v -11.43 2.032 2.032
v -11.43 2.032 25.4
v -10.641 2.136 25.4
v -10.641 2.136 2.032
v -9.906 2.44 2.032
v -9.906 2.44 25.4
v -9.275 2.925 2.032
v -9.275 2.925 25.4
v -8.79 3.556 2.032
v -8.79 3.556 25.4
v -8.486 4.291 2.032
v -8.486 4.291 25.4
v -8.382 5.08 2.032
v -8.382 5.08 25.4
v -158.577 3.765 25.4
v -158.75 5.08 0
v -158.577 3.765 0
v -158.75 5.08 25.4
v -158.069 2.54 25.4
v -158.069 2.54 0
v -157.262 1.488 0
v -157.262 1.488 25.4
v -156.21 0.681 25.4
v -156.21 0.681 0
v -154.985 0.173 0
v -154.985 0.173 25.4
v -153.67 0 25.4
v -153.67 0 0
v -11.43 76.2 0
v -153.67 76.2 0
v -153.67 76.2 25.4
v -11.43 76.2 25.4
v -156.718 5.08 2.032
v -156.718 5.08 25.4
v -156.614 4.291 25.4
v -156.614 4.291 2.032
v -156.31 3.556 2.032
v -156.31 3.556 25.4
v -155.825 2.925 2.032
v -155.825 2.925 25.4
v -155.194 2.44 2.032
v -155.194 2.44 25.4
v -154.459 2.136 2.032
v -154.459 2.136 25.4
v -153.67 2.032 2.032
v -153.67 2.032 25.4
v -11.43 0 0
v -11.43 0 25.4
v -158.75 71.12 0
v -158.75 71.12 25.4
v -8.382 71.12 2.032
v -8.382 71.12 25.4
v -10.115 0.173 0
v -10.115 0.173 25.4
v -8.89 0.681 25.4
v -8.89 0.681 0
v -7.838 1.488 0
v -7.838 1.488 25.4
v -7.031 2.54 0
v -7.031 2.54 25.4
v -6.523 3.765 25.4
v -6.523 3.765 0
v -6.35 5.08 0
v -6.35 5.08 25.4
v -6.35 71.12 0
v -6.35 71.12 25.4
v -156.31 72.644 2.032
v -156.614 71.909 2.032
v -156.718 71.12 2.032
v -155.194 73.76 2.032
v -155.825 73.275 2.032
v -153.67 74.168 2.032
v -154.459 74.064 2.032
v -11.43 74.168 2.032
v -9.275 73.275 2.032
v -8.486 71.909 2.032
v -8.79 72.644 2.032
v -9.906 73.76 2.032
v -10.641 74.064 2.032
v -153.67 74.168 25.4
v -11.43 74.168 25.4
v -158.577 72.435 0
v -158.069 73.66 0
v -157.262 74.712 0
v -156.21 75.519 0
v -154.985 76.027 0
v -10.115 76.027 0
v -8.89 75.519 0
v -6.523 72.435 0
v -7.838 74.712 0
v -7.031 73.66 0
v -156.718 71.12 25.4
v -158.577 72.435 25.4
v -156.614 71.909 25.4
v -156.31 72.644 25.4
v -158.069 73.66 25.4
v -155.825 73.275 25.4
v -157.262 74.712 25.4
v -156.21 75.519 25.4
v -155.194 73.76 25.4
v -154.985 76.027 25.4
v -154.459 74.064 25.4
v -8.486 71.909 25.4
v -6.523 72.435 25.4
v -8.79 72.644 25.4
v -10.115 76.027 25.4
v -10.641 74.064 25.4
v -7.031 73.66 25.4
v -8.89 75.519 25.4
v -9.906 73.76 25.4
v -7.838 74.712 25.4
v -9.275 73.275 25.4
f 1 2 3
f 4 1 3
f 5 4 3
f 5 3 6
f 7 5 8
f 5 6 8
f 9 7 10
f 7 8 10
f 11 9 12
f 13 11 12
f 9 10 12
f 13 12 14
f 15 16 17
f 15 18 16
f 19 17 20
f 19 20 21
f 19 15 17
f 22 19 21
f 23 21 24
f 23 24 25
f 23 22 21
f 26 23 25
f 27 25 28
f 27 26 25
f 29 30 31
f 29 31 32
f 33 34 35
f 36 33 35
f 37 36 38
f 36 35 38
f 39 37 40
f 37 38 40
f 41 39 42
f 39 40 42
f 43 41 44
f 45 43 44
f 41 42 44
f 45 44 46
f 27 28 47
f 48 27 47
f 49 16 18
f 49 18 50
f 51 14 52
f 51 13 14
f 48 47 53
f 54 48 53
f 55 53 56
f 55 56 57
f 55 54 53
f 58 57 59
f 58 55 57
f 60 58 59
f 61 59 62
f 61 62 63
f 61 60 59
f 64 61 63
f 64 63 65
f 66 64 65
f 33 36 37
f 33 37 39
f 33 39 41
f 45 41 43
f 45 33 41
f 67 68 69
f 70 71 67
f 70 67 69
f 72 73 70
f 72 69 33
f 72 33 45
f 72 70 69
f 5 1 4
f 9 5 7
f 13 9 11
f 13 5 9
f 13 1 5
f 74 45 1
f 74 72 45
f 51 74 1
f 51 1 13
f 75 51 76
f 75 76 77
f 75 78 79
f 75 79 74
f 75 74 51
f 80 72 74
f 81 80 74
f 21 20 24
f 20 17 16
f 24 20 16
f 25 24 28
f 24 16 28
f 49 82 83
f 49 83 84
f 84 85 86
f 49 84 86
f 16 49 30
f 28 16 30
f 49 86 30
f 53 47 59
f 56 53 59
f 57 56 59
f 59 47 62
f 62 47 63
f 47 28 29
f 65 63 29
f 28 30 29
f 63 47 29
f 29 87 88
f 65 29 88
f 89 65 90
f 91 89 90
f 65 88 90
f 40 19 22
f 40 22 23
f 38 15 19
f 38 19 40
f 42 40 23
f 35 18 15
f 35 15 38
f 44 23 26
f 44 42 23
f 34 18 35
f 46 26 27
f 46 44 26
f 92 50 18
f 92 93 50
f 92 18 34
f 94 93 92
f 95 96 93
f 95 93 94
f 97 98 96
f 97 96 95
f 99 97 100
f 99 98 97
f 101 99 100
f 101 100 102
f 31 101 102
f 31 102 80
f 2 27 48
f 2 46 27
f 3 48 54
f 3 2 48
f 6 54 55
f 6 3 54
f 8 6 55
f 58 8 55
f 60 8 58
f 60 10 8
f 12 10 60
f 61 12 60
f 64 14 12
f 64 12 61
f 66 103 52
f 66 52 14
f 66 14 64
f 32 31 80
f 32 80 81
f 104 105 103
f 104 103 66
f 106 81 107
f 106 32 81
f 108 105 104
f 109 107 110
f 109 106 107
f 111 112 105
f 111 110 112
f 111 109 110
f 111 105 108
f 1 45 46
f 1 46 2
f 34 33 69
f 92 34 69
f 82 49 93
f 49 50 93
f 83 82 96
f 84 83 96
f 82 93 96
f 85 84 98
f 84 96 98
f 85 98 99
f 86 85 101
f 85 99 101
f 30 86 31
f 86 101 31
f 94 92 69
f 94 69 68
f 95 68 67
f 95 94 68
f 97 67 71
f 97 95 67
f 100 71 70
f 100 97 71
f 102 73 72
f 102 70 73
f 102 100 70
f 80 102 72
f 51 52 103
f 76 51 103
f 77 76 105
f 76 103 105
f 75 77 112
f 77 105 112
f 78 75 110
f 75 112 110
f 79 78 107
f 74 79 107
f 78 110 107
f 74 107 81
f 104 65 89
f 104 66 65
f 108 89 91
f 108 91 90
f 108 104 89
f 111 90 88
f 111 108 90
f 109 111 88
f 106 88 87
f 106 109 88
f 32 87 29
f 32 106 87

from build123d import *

# Parameters (mm, degrees)
F0_W     = 152.4
F0_H     = 76.2
F1_DEPTH = 25.4
F2_R     = 5.08
F3_T     = -2.032


with BuildPart() as f1:
    # F0 (on Top) → F1 (new body)
    with BuildSketch(Plane.XY):
        with Locations((-82.550001, 38.1)):
            Rectangle(F0_W, F0_H)
    extrude(amount=F1_DEPTH)

    # F2
    f2_edges = [f1.edges().sort_by_distance(p)[0] for p in [
        (-158.750001, 0, 12.7),
        (-6.350001, 0, 12.7),
        (-158.750001, 76.2, 12.7),
        (-6.350001, 76.2, 12.7),
    ]]
    fillet(f2_edges, radius=F2_R)

    # F3
    f3_openings = [f1.faces().sort_by_distance(p)[0] for p in [
        (-82.550001, 38.1, 25.4),
    ]]
    offset(amount=F3_T, openings=f3_openings)


solid = f1.part
